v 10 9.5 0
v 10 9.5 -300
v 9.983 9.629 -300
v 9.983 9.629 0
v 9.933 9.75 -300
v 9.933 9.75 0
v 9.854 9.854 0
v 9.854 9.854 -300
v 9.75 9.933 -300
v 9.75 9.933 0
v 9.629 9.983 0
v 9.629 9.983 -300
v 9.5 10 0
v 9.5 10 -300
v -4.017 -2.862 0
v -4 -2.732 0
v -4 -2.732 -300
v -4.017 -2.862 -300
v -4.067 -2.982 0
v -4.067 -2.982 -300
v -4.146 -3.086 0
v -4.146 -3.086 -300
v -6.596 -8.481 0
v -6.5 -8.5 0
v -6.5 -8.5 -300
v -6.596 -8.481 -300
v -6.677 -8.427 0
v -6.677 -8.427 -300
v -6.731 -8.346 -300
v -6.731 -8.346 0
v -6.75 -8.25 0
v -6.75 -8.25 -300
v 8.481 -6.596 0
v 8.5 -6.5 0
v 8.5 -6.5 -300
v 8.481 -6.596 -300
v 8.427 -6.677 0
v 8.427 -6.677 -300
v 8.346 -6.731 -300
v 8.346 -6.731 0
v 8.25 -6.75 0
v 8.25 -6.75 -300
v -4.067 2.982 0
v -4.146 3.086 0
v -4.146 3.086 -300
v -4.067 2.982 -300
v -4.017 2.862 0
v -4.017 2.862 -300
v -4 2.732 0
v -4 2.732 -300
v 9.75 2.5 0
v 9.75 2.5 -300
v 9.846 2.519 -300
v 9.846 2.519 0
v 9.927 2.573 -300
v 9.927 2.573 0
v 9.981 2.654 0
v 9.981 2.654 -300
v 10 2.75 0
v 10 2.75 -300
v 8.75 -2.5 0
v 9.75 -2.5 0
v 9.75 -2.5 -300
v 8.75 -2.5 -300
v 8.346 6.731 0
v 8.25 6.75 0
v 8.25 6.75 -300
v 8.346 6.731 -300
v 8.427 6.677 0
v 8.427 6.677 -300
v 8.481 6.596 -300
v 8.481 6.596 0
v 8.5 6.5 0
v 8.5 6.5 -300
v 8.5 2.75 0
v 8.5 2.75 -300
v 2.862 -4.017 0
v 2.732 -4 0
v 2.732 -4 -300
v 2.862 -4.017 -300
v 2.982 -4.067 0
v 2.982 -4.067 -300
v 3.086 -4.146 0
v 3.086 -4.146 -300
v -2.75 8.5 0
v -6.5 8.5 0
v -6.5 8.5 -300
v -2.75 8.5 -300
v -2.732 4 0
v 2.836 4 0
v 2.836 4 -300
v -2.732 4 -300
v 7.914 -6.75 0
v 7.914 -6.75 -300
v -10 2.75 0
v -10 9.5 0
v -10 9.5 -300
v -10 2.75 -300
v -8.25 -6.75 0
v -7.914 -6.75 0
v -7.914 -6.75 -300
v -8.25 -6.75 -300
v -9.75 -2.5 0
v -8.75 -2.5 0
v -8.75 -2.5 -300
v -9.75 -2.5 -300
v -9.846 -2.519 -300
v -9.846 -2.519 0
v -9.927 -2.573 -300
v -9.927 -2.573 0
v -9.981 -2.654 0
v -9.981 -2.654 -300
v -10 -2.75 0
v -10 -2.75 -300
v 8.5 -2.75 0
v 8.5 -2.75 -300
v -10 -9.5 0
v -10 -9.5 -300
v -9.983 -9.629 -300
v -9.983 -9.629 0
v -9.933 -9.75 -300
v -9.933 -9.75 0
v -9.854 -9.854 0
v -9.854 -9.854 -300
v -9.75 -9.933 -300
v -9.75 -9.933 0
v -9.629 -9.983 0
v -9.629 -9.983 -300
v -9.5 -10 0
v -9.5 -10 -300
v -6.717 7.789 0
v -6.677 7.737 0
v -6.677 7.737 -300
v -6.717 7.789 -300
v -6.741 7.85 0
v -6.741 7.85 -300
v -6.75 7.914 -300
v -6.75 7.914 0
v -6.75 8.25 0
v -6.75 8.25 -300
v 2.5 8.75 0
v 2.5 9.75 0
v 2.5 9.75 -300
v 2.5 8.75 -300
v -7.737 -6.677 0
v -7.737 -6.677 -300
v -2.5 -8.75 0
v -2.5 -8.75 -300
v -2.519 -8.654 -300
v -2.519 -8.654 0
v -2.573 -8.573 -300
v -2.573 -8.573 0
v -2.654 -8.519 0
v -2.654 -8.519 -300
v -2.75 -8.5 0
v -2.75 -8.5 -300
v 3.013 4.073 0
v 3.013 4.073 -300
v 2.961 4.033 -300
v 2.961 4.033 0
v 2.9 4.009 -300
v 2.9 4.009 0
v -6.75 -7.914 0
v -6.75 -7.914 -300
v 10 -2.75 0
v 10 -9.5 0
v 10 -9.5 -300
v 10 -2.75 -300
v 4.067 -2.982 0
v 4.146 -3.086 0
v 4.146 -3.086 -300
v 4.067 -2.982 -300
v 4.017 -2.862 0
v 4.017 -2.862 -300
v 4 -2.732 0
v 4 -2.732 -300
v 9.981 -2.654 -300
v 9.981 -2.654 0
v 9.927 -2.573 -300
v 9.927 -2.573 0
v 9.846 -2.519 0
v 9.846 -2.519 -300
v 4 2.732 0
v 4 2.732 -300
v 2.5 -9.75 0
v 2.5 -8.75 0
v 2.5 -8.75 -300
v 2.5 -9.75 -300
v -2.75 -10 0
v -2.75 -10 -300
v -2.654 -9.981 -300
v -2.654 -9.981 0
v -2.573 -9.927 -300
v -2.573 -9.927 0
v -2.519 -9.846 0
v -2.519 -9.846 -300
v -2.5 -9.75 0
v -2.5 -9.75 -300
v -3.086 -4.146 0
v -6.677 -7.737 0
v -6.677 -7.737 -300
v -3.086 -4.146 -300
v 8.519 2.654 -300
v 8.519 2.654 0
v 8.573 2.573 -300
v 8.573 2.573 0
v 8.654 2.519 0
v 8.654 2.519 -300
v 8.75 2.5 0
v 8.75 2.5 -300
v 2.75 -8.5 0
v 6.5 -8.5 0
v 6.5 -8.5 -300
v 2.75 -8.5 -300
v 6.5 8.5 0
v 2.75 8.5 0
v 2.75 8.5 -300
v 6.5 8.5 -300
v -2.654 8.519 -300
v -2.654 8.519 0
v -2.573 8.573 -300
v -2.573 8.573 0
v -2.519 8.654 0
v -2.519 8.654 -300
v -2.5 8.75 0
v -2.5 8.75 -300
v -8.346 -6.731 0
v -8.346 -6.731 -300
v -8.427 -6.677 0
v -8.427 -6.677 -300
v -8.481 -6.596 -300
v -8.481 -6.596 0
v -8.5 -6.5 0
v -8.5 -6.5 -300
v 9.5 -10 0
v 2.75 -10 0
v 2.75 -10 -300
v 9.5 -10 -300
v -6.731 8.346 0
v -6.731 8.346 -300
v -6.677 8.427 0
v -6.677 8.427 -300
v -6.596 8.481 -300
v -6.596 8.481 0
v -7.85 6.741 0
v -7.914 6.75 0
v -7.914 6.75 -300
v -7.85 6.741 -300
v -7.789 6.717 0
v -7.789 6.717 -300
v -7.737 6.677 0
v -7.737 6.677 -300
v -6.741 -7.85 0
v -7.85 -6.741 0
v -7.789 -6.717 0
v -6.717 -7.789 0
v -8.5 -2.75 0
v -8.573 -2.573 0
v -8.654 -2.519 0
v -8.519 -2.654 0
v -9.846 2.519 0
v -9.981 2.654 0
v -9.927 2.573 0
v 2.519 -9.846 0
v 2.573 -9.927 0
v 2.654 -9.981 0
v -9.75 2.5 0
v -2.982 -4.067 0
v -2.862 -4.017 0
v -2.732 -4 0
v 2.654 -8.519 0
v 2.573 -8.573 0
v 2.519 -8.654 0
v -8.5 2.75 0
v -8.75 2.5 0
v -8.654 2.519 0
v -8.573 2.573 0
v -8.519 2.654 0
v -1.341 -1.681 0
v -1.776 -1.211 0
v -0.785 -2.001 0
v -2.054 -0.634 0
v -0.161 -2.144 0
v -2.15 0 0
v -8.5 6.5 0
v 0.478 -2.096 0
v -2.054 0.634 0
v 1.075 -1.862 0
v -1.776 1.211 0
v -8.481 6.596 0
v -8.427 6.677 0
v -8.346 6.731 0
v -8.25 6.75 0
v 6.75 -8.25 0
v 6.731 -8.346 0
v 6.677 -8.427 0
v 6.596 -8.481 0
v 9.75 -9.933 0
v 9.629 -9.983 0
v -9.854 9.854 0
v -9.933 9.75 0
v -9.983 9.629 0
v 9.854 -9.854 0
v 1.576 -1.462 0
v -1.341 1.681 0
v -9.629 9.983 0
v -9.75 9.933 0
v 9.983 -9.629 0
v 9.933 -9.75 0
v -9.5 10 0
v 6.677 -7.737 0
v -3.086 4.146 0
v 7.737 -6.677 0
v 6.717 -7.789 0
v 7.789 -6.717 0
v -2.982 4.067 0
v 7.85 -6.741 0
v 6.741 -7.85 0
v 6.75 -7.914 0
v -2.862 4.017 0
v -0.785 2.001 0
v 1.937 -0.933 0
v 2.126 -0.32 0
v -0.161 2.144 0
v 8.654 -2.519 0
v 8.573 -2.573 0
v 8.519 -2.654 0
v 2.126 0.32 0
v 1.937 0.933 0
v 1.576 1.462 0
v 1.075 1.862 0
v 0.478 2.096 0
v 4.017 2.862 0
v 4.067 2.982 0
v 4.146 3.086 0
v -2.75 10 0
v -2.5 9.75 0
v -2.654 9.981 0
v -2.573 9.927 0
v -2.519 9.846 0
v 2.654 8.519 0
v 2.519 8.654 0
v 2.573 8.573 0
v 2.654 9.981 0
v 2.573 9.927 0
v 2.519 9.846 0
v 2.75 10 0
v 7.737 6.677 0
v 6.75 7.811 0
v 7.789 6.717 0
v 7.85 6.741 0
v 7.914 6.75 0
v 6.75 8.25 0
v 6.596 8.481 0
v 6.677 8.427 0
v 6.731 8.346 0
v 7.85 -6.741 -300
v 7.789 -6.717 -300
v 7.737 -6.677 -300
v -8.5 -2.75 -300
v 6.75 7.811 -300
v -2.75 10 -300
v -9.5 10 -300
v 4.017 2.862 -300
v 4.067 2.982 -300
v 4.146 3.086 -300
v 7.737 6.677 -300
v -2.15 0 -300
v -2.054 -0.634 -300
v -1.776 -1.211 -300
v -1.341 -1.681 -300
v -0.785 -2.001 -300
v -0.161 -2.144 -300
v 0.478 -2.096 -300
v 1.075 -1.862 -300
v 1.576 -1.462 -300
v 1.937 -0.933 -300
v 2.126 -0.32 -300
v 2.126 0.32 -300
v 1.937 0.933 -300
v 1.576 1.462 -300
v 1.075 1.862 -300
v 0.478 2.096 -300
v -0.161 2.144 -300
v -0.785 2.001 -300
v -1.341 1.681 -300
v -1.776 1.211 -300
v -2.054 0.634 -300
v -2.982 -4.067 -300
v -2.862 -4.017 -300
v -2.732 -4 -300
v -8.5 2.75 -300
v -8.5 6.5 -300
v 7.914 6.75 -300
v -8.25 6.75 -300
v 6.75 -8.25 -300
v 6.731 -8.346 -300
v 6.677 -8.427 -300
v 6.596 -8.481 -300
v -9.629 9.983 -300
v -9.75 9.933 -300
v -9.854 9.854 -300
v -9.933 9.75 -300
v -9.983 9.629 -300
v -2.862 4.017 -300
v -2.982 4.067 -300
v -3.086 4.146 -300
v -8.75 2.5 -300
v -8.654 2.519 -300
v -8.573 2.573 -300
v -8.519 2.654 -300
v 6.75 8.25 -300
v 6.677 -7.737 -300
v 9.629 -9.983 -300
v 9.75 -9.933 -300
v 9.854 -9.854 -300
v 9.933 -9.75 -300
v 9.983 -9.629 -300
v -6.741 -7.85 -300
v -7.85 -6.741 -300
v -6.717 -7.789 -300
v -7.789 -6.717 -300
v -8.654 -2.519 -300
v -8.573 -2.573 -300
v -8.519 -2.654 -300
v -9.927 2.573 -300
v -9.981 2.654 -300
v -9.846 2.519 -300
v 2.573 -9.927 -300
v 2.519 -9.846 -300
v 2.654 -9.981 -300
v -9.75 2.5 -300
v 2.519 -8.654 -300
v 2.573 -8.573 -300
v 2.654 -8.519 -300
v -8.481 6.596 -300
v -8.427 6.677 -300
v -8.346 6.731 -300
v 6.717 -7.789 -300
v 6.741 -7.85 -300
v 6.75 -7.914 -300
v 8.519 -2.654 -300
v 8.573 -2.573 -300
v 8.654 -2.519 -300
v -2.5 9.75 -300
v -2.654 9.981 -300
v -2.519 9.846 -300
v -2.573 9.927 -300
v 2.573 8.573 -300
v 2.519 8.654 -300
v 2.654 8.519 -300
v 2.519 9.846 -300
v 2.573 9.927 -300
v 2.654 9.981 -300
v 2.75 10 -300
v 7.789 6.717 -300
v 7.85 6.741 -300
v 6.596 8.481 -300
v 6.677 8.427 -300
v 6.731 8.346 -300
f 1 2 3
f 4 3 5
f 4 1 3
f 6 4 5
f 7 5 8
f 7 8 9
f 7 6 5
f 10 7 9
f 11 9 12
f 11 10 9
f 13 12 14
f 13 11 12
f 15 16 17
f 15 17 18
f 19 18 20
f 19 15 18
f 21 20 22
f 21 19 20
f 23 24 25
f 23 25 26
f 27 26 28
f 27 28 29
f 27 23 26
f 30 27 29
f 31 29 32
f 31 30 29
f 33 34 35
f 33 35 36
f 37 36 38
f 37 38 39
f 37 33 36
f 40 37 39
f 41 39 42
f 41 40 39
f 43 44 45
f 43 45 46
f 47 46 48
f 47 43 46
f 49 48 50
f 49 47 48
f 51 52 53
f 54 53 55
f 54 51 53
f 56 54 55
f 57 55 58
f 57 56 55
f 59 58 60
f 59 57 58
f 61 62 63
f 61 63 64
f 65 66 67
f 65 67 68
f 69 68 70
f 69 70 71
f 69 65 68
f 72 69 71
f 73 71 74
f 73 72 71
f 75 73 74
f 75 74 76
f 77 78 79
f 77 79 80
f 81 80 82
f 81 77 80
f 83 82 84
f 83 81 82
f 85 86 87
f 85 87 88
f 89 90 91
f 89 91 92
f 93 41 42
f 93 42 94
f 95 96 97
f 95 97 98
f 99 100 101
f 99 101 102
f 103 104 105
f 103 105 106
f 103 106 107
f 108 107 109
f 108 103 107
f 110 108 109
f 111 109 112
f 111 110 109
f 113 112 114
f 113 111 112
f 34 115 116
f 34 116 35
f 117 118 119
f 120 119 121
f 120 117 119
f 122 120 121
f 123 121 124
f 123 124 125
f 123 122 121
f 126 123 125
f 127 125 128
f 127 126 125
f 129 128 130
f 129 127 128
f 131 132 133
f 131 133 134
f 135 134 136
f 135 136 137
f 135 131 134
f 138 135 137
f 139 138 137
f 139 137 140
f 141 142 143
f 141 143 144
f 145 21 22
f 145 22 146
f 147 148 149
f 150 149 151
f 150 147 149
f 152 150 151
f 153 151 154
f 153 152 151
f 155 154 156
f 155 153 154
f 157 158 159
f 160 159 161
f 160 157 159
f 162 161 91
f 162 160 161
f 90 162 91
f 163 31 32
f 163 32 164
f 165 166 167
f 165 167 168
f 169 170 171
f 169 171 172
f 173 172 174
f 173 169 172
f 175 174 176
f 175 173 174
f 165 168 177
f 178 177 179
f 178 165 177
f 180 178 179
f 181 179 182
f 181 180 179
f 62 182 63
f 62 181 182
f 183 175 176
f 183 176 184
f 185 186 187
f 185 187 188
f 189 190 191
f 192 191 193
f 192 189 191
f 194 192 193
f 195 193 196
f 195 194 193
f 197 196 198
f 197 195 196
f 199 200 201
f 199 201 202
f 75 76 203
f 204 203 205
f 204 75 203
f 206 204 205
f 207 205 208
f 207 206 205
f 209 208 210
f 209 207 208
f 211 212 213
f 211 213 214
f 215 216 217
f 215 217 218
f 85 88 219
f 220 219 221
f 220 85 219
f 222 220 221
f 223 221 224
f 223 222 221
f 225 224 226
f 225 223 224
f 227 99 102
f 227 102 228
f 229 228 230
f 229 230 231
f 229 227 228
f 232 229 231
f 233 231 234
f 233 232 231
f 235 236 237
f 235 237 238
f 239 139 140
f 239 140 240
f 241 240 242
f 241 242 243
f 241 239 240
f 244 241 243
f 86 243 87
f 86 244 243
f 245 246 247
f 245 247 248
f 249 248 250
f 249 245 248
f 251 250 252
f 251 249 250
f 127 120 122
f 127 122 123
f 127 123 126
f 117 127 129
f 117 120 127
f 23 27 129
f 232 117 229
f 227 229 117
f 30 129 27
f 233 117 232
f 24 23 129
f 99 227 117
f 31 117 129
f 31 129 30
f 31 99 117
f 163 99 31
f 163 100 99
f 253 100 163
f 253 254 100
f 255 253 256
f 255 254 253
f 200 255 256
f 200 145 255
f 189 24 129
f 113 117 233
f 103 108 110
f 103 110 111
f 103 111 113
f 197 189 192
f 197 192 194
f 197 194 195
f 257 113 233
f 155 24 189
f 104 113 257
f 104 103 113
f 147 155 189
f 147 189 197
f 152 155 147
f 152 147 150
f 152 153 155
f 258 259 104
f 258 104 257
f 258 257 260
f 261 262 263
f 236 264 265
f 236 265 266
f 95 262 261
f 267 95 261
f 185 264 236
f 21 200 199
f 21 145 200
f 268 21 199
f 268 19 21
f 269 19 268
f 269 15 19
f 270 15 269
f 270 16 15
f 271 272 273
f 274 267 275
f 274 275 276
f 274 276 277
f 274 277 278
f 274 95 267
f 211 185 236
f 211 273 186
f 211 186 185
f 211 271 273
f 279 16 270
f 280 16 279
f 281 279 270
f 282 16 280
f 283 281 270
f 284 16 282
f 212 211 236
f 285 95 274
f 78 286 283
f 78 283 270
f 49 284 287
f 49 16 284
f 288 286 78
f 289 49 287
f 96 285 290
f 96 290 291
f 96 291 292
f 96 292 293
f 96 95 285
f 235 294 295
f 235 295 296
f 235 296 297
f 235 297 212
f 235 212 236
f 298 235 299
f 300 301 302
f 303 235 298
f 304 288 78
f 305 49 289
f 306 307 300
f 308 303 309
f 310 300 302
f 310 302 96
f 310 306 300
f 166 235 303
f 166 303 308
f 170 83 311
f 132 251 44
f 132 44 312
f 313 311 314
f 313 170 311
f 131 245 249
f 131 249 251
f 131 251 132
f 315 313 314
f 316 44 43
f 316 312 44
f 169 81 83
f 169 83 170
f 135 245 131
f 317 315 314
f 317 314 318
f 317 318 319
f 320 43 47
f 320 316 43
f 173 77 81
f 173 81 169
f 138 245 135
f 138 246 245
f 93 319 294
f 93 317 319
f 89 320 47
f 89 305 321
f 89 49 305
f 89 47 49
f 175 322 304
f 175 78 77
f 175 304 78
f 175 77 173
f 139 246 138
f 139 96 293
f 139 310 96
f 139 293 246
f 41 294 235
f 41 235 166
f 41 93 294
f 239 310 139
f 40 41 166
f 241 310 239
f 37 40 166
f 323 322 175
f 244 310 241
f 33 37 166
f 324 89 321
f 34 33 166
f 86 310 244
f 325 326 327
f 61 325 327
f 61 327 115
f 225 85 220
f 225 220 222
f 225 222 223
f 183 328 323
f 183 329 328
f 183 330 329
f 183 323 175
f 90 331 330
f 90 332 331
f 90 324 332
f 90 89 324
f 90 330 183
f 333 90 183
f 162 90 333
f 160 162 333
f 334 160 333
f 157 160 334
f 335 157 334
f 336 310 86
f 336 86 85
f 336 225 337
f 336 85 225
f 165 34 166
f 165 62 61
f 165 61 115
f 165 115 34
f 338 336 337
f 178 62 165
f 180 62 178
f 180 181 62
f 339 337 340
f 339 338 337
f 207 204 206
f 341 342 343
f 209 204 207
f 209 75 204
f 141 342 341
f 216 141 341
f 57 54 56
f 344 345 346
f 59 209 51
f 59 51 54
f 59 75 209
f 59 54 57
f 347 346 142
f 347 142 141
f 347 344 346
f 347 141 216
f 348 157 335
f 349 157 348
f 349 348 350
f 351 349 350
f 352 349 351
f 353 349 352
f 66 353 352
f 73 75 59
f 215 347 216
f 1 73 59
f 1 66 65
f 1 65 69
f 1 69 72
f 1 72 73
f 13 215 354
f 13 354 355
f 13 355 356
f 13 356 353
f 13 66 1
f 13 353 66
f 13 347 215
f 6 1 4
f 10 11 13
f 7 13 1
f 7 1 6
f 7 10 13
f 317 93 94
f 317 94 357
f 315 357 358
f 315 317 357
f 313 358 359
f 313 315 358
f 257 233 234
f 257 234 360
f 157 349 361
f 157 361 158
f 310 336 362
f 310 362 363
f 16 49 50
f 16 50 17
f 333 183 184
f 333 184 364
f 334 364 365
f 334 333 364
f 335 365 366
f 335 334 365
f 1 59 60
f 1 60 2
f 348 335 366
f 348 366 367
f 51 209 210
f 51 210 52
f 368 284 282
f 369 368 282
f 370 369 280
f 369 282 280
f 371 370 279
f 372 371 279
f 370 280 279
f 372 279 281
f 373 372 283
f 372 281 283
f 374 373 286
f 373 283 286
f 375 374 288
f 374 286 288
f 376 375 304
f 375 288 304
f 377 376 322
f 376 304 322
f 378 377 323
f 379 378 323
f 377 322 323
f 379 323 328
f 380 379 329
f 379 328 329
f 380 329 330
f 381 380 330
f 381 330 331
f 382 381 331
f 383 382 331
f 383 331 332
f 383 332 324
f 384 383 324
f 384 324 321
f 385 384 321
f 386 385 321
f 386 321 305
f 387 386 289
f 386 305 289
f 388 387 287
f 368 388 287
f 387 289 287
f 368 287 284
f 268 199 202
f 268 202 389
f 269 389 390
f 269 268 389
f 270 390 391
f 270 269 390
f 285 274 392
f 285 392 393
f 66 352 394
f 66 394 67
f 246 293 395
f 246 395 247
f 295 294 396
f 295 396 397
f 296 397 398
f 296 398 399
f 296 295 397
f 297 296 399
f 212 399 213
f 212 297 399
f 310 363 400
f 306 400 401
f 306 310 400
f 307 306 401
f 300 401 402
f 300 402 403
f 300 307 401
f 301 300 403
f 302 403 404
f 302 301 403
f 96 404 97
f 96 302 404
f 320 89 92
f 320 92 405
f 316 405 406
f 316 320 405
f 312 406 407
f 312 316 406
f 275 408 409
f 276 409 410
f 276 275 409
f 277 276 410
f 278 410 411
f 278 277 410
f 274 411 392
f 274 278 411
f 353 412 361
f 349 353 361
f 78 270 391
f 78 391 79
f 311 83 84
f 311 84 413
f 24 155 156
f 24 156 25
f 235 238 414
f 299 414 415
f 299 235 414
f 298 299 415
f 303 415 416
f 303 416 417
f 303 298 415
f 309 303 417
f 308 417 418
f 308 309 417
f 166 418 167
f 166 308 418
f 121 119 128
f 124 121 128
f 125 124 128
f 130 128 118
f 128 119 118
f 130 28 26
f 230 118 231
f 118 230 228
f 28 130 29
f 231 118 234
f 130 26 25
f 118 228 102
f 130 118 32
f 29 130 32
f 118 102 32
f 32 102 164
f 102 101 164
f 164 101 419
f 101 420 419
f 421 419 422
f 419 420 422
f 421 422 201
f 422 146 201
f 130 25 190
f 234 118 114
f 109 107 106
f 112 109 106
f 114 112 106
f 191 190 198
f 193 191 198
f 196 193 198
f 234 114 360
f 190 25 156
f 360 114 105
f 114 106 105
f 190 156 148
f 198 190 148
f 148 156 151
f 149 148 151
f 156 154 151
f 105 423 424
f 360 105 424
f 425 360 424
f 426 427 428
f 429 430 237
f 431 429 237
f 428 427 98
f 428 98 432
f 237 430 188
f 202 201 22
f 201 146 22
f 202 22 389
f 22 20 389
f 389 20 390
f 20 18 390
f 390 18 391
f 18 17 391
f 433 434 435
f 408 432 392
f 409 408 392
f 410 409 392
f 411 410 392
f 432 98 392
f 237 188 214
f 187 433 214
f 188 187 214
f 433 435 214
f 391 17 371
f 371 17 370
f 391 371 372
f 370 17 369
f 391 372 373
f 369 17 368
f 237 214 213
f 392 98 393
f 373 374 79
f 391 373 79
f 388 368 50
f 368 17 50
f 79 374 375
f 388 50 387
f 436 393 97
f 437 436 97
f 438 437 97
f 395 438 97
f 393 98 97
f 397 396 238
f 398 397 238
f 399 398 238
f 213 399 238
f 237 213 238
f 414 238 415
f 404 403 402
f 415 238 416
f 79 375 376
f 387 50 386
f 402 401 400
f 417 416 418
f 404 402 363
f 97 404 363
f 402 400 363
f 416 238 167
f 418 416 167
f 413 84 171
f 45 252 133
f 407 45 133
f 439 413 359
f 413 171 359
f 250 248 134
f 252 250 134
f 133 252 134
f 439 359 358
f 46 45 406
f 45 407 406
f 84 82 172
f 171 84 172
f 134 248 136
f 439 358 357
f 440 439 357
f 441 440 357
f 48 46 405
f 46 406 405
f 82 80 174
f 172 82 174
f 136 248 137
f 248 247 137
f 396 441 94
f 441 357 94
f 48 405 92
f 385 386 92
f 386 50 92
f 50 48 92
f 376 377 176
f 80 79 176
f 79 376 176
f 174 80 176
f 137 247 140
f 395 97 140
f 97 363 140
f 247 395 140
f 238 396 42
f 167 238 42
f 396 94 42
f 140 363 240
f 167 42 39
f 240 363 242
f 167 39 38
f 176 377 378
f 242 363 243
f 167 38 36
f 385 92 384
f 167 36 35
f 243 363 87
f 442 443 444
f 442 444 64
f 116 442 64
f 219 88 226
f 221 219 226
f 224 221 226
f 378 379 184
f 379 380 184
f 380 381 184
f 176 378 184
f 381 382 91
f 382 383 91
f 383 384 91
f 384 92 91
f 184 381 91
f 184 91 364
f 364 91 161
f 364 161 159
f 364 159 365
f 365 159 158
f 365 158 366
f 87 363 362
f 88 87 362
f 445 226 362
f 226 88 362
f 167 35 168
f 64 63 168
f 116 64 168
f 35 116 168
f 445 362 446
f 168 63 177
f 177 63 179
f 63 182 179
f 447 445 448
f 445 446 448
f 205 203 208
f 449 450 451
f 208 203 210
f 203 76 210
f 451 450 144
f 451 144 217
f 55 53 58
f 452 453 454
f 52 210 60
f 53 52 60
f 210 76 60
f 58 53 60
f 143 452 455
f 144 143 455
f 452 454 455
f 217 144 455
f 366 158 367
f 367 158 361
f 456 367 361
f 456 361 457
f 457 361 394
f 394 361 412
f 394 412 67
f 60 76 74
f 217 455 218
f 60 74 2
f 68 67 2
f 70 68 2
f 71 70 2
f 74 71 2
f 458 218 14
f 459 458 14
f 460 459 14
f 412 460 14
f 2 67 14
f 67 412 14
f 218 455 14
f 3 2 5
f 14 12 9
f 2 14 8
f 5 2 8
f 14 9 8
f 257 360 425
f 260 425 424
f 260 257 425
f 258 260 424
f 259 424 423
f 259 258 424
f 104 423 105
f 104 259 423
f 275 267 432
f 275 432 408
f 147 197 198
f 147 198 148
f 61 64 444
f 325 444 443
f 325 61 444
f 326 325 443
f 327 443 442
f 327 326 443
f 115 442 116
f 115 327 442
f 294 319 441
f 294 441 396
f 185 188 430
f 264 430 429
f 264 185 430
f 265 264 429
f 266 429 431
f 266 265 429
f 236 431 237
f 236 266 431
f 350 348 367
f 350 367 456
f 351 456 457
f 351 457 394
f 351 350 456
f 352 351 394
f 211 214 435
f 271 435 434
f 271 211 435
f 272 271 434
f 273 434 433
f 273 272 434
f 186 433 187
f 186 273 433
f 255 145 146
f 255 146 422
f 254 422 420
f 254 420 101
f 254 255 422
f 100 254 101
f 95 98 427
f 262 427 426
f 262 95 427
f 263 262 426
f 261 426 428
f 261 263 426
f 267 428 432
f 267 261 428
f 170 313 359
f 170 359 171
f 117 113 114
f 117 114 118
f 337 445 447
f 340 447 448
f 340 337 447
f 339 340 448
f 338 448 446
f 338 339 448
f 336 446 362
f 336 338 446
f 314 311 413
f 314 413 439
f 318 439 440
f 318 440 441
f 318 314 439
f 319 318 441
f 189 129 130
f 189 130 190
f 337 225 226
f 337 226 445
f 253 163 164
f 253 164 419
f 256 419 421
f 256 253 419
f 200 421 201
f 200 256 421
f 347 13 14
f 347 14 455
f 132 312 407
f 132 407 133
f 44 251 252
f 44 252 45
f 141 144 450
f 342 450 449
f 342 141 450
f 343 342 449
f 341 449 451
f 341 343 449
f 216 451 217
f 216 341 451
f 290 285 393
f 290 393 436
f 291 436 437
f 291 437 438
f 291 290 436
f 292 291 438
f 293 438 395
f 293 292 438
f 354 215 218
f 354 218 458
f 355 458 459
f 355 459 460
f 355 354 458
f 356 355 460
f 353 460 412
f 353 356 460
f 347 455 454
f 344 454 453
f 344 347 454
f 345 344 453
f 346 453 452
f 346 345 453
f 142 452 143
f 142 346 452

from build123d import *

# Parameters (mm, degrees)
SKETCH_1_R      = 2.15
EXTRUDE_1_DEPTH = 300


with BuildPart() as part:
    # Эскиз1 → Бобышка-Вытянуть1 (new body)
    with BuildSketch(Plane.XY):
        with BuildLine():
            Line((-10, -2.75), (-10, -9.5))
            ThreePointArc((-10, -9.5), (-9.853553391, -9.853553391), (-9.5, -10))
            Line((-9.5, -10), (-2.75, -10))
            ThreePointArc((-2.75, -10), (-2.573223305, -9.926776695), (-2.5, -9.75))
            Line((-2.5, -9.75), (-2.5, -8.75))
            ThreePointArc((-2.5, -8.75), (-2.573223305, -8.573223305), (-2.75, -8.5))
            Line((-2.75, -8.5), (-6.5, -8.5))
            ThreePointArc((-6.5, -8.5), (-6.676776695, -8.426776695), (-6.75, -8.25))
            Line((-6.75, -8.25), (-6.75, -7.914213562))
            ThreePointArc((-6.75, -7.914213562), (-6.730969883, -7.818542704), (-6.676776695, -7.737436867))
            Line((-6.676776695, -7.737436867), (-3.085786438, -4.146446609))
            ThreePointArc((-3.085786438, -4.146446609), (-2.923574763, -4.038060234), (-2.732233047, -4))
            Line((-2.732233047, -4), (2.732233047, -4))
            ThreePointArc((2.732233047, -4), (2.923574763, -4.038060234), (3.085786438, -4.146446609))
            Line((3.085786438, -4.146446609), (6.676776695, -7.737436867))
            ThreePointArc((6.676776695, -7.737436867), (6.730969883, -7.818542704), (6.75, -7.914213562))
            Line((6.75, -7.914213562), (6.75, -8.25))
            ThreePointArc((6.75, -8.25), (6.676776695, -8.426776695), (6.5, -8.5))
            Line((6.5, -8.5), (2.75, -8.5))
            ThreePointArc((2.75, -8.5), (2.573223305, -8.573223305), (2.5, -8.75))
            Line((2.5, -8.75), (2.5, -9.75))
            ThreePointArc((2.5, -9.75), (2.573223305, -9.926776695), (2.75, -10))
            Line((2.75, -10), (9.5, -10))
            ThreePointArc((9.5, -10), (9.853553391, -9.853553391), (10, -9.5))
            Line((10, -9.5), (10, -2.75))
            ThreePointArc((10, -2.75), (9.926776695, -2.573223305), (9.75, -2.5))
            Line((9.75, -2.5), (8.75, -2.5))
            ThreePointArc((8.75, -2.5), (8.573223305, -2.573223305), (8.5, -2.75))
            Line((8.5, -2.75), (8.5, -6.5))
            ThreePointArc((8.5, -6.5), (8.426776695, -6.676776695), (8.25, -6.75))
            Line((8.25, -6.75), (7.914213562, -6.75))
            ThreePointArc((7.914213562, -6.75), (7.818542704, -6.730969883), (7.737436867, -6.676776695))
            Line((7.737436867, -6.676776695), (4.146446609, -3.085786438))
            ThreePointArc((4.146446609, -3.085786438), (4.038060234, -2.923574763), (4, -2.732233047))
            Line((4, -2.732233047), (4, 2.732233047))
            ThreePointArc((4, 2.732233047), (4.038060234, 2.923574763), (4.146446609, 3.085786438))
            Line((4.146446609, 3.085786438), (7.737436867, 6.676776695))
            ThreePointArc((7.737436867, 6.676776695), (7.818542704, 6.730969883), (7.914213562, 6.75))
            Line((7.914213562, 6.75), (8.25, 6.75))
            ThreePointArc((8.25, 6.75), (8.426776695, 6.676776695), (8.5, 6.5))
            Line((8.5, 6.5), (8.5, 2.75))
            ThreePointArc((8.5, 2.75), (8.573223305, 2.573223305), (8.75, 2.5))
            Line((8.75, 2.5), (9.75, 2.5))
            ThreePointArc((9.75, 2.5), (9.926776695, 2.573223305), (10, 2.75))
            Line((10, 2.75), (10, 9.5))
            ThreePointArc((10, 9.5), (9.853553391, 9.853553391), (9.5, 10))
            Line((9.5, 10), (2.75, 10))
            ThreePointArc((2.75, 10), (2.573223305, 9.926776695), (2.5, 9.75))
            Line((2.5, 9.75), (2.5, 8.75))
            ThreePointArc((2.5, 8.75), (2.573223305, 8.573223305), (2.75, 8.5))
            Line((2.75, 8.5), (6.5, 8.5))
            ThreePointArc((6.5, 8.5), (6.676776695, 8.426776695), (6.75, 8.25))
            Line((6.75, 8.25), (6.75, 7.810660172))
            Line((6.75, 7.810660172), (3.012563133, 4.073223305))
            ThreePointArc((3.012563133, 4.073223305), (2.931457296, 4.019030117), (2.835786438, 4))
            Line((2.835786438, 4), (-2.732233047, 4))
            ThreePointArc((-2.732233047, 4), (-2.923574763, 4.038060234), (-3.085786438, 4.146446609))
            Line((-3.085786438, 4.146446609), (-6.676776695, 7.737436867))
            ThreePointArc((-6.676776695, 7.737436867), (-6.730969883, 7.818542704), (-6.75, 7.914213562))
            Line((-6.75, 7.914213562), (-6.75, 8.25))
            ThreePointArc((-6.75, 8.25), (-6.676776695, 8.426776695), (-6.5, 8.5))
            Line((-6.5, 8.5), (-2.75, 8.5))
            ThreePointArc((-2.75, 8.5), (-2.573223305, 8.573223305), (-2.5, 8.75))
            Line((-2.5, 8.75), (-2.5, 9.75))
            ThreePointArc((-2.5, 9.75), (-2.573223305, 9.926776695), (-2.75, 10))
            Line((-2.75, 10), (-9.5, 10))
            ThreePointArc((-9.5, 10), (-9.853553391, 9.853553391), (-10, 9.5))
            Line((-10, 9.5), (-10, 2.75))
            ThreePointArc((-10, 2.75), (-9.926776695, 2.573223305), (-9.75, 2.5))
            Line((-9.75, 2.5), (-8.75, 2.5))
            ThreePointArc((-8.75, 2.5), (-8.573223305, 2.573223305), (-8.5, 2.75))
            Line((-8.5, 2.75), (-8.5, 6.5))
            ThreePointArc((-8.5, 6.5), (-8.426776695, 6.676776695), (-8.25, 6.75))
            Line((-8.25, 6.75), (-7.914213562, 6.75))
            ThreePointArc((-7.914213562, 6.75), (-7.818542704, 6.730969883), (-7.737436867, 6.676776695))
            Line((-7.737436867, 6.676776695), (-4.146446609, 3.085786438))
            ThreePointArc((-4.146446609, 3.085786438), (-4.038060234, 2.923574763), (-4, 2.732233047))
            Line((-4, 2.732233047), (-4, -2.732233047))
            ThreePointArc((-4, -2.732233047), (-4.038060234, -2.923574763), (-4.146446609, -3.085786438))
            Line((-4.146446609, -3.085786438), (-7.737436867, -6.676776695))
            ThreePointArc((-7.737436867, -6.676776695), (-7.818542704, -6.730969883), (-7.914213562, -6.75))
            Line((-7.914213562, -6.75), (-8.25, -6.75))
            ThreePointArc((-8.25, -6.75), (-8.426776695, -6.676776695), (-8.5, -6.5))
            Line((-8.5, -6.5), (-8.5, -2.75))
            ThreePointArc((-8.5, -2.75), (-8.573223305, -2.573223305), (-8.75, -2.5))
            Line((-8.75, -2.5), (-9.75, -2.5))
            ThreePointArc((-9.75, -2.5), (-9.926776695, -2.573223305), (-10, -2.75))
        make_face()
        with Locations(Location((0, 0, 0), (0, 0, 180))):
            Circle(SKETCH_1_R, mode=Mode.SUBTRACT)
    extrude(amount=-EXTRUDE_1_DEPTH)


solid = part.part
